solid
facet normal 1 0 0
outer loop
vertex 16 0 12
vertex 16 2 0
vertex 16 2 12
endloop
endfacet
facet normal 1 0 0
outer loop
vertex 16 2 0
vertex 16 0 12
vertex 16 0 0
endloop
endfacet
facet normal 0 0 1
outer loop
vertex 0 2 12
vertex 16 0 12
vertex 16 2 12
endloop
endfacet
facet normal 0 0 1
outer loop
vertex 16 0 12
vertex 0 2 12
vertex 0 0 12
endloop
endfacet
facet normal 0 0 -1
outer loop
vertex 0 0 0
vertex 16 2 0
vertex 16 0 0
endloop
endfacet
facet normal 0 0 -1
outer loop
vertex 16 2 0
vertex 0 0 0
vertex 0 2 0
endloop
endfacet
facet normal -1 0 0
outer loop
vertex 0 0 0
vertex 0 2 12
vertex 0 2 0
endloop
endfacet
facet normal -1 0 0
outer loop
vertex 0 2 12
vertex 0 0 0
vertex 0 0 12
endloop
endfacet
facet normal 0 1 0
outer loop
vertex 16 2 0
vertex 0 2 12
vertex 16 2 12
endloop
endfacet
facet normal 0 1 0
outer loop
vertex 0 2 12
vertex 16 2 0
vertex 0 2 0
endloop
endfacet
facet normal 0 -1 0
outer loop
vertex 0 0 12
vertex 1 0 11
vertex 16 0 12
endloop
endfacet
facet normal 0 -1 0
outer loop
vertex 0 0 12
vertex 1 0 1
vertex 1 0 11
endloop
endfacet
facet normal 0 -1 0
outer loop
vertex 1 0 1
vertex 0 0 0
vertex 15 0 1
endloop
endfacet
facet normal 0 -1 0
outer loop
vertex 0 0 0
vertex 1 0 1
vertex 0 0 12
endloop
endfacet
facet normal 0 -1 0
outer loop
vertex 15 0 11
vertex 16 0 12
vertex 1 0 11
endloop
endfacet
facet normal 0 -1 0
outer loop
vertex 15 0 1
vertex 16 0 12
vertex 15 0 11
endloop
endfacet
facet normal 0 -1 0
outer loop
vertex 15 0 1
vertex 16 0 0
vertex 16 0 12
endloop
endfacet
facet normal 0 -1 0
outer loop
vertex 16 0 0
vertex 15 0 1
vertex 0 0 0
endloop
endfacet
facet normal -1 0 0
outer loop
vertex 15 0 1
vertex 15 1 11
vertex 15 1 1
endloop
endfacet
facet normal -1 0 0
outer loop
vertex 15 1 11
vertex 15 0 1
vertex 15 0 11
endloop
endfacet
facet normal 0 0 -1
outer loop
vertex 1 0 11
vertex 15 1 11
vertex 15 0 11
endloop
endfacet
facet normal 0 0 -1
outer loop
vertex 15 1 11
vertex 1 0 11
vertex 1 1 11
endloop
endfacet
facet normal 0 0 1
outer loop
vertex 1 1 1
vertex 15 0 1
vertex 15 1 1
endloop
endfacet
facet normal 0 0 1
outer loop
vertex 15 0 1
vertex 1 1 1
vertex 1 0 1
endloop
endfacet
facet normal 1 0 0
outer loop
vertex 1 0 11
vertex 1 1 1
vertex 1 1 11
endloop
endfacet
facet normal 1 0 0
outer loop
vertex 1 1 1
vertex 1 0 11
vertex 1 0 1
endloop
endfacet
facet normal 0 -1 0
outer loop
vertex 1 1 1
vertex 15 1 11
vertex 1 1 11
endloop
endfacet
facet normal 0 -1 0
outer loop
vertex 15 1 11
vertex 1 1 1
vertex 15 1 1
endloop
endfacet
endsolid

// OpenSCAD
difference() {
    cube([16, 2, 12]);
    translate([1,0,1]) cube([14, 1, 10]);
}
